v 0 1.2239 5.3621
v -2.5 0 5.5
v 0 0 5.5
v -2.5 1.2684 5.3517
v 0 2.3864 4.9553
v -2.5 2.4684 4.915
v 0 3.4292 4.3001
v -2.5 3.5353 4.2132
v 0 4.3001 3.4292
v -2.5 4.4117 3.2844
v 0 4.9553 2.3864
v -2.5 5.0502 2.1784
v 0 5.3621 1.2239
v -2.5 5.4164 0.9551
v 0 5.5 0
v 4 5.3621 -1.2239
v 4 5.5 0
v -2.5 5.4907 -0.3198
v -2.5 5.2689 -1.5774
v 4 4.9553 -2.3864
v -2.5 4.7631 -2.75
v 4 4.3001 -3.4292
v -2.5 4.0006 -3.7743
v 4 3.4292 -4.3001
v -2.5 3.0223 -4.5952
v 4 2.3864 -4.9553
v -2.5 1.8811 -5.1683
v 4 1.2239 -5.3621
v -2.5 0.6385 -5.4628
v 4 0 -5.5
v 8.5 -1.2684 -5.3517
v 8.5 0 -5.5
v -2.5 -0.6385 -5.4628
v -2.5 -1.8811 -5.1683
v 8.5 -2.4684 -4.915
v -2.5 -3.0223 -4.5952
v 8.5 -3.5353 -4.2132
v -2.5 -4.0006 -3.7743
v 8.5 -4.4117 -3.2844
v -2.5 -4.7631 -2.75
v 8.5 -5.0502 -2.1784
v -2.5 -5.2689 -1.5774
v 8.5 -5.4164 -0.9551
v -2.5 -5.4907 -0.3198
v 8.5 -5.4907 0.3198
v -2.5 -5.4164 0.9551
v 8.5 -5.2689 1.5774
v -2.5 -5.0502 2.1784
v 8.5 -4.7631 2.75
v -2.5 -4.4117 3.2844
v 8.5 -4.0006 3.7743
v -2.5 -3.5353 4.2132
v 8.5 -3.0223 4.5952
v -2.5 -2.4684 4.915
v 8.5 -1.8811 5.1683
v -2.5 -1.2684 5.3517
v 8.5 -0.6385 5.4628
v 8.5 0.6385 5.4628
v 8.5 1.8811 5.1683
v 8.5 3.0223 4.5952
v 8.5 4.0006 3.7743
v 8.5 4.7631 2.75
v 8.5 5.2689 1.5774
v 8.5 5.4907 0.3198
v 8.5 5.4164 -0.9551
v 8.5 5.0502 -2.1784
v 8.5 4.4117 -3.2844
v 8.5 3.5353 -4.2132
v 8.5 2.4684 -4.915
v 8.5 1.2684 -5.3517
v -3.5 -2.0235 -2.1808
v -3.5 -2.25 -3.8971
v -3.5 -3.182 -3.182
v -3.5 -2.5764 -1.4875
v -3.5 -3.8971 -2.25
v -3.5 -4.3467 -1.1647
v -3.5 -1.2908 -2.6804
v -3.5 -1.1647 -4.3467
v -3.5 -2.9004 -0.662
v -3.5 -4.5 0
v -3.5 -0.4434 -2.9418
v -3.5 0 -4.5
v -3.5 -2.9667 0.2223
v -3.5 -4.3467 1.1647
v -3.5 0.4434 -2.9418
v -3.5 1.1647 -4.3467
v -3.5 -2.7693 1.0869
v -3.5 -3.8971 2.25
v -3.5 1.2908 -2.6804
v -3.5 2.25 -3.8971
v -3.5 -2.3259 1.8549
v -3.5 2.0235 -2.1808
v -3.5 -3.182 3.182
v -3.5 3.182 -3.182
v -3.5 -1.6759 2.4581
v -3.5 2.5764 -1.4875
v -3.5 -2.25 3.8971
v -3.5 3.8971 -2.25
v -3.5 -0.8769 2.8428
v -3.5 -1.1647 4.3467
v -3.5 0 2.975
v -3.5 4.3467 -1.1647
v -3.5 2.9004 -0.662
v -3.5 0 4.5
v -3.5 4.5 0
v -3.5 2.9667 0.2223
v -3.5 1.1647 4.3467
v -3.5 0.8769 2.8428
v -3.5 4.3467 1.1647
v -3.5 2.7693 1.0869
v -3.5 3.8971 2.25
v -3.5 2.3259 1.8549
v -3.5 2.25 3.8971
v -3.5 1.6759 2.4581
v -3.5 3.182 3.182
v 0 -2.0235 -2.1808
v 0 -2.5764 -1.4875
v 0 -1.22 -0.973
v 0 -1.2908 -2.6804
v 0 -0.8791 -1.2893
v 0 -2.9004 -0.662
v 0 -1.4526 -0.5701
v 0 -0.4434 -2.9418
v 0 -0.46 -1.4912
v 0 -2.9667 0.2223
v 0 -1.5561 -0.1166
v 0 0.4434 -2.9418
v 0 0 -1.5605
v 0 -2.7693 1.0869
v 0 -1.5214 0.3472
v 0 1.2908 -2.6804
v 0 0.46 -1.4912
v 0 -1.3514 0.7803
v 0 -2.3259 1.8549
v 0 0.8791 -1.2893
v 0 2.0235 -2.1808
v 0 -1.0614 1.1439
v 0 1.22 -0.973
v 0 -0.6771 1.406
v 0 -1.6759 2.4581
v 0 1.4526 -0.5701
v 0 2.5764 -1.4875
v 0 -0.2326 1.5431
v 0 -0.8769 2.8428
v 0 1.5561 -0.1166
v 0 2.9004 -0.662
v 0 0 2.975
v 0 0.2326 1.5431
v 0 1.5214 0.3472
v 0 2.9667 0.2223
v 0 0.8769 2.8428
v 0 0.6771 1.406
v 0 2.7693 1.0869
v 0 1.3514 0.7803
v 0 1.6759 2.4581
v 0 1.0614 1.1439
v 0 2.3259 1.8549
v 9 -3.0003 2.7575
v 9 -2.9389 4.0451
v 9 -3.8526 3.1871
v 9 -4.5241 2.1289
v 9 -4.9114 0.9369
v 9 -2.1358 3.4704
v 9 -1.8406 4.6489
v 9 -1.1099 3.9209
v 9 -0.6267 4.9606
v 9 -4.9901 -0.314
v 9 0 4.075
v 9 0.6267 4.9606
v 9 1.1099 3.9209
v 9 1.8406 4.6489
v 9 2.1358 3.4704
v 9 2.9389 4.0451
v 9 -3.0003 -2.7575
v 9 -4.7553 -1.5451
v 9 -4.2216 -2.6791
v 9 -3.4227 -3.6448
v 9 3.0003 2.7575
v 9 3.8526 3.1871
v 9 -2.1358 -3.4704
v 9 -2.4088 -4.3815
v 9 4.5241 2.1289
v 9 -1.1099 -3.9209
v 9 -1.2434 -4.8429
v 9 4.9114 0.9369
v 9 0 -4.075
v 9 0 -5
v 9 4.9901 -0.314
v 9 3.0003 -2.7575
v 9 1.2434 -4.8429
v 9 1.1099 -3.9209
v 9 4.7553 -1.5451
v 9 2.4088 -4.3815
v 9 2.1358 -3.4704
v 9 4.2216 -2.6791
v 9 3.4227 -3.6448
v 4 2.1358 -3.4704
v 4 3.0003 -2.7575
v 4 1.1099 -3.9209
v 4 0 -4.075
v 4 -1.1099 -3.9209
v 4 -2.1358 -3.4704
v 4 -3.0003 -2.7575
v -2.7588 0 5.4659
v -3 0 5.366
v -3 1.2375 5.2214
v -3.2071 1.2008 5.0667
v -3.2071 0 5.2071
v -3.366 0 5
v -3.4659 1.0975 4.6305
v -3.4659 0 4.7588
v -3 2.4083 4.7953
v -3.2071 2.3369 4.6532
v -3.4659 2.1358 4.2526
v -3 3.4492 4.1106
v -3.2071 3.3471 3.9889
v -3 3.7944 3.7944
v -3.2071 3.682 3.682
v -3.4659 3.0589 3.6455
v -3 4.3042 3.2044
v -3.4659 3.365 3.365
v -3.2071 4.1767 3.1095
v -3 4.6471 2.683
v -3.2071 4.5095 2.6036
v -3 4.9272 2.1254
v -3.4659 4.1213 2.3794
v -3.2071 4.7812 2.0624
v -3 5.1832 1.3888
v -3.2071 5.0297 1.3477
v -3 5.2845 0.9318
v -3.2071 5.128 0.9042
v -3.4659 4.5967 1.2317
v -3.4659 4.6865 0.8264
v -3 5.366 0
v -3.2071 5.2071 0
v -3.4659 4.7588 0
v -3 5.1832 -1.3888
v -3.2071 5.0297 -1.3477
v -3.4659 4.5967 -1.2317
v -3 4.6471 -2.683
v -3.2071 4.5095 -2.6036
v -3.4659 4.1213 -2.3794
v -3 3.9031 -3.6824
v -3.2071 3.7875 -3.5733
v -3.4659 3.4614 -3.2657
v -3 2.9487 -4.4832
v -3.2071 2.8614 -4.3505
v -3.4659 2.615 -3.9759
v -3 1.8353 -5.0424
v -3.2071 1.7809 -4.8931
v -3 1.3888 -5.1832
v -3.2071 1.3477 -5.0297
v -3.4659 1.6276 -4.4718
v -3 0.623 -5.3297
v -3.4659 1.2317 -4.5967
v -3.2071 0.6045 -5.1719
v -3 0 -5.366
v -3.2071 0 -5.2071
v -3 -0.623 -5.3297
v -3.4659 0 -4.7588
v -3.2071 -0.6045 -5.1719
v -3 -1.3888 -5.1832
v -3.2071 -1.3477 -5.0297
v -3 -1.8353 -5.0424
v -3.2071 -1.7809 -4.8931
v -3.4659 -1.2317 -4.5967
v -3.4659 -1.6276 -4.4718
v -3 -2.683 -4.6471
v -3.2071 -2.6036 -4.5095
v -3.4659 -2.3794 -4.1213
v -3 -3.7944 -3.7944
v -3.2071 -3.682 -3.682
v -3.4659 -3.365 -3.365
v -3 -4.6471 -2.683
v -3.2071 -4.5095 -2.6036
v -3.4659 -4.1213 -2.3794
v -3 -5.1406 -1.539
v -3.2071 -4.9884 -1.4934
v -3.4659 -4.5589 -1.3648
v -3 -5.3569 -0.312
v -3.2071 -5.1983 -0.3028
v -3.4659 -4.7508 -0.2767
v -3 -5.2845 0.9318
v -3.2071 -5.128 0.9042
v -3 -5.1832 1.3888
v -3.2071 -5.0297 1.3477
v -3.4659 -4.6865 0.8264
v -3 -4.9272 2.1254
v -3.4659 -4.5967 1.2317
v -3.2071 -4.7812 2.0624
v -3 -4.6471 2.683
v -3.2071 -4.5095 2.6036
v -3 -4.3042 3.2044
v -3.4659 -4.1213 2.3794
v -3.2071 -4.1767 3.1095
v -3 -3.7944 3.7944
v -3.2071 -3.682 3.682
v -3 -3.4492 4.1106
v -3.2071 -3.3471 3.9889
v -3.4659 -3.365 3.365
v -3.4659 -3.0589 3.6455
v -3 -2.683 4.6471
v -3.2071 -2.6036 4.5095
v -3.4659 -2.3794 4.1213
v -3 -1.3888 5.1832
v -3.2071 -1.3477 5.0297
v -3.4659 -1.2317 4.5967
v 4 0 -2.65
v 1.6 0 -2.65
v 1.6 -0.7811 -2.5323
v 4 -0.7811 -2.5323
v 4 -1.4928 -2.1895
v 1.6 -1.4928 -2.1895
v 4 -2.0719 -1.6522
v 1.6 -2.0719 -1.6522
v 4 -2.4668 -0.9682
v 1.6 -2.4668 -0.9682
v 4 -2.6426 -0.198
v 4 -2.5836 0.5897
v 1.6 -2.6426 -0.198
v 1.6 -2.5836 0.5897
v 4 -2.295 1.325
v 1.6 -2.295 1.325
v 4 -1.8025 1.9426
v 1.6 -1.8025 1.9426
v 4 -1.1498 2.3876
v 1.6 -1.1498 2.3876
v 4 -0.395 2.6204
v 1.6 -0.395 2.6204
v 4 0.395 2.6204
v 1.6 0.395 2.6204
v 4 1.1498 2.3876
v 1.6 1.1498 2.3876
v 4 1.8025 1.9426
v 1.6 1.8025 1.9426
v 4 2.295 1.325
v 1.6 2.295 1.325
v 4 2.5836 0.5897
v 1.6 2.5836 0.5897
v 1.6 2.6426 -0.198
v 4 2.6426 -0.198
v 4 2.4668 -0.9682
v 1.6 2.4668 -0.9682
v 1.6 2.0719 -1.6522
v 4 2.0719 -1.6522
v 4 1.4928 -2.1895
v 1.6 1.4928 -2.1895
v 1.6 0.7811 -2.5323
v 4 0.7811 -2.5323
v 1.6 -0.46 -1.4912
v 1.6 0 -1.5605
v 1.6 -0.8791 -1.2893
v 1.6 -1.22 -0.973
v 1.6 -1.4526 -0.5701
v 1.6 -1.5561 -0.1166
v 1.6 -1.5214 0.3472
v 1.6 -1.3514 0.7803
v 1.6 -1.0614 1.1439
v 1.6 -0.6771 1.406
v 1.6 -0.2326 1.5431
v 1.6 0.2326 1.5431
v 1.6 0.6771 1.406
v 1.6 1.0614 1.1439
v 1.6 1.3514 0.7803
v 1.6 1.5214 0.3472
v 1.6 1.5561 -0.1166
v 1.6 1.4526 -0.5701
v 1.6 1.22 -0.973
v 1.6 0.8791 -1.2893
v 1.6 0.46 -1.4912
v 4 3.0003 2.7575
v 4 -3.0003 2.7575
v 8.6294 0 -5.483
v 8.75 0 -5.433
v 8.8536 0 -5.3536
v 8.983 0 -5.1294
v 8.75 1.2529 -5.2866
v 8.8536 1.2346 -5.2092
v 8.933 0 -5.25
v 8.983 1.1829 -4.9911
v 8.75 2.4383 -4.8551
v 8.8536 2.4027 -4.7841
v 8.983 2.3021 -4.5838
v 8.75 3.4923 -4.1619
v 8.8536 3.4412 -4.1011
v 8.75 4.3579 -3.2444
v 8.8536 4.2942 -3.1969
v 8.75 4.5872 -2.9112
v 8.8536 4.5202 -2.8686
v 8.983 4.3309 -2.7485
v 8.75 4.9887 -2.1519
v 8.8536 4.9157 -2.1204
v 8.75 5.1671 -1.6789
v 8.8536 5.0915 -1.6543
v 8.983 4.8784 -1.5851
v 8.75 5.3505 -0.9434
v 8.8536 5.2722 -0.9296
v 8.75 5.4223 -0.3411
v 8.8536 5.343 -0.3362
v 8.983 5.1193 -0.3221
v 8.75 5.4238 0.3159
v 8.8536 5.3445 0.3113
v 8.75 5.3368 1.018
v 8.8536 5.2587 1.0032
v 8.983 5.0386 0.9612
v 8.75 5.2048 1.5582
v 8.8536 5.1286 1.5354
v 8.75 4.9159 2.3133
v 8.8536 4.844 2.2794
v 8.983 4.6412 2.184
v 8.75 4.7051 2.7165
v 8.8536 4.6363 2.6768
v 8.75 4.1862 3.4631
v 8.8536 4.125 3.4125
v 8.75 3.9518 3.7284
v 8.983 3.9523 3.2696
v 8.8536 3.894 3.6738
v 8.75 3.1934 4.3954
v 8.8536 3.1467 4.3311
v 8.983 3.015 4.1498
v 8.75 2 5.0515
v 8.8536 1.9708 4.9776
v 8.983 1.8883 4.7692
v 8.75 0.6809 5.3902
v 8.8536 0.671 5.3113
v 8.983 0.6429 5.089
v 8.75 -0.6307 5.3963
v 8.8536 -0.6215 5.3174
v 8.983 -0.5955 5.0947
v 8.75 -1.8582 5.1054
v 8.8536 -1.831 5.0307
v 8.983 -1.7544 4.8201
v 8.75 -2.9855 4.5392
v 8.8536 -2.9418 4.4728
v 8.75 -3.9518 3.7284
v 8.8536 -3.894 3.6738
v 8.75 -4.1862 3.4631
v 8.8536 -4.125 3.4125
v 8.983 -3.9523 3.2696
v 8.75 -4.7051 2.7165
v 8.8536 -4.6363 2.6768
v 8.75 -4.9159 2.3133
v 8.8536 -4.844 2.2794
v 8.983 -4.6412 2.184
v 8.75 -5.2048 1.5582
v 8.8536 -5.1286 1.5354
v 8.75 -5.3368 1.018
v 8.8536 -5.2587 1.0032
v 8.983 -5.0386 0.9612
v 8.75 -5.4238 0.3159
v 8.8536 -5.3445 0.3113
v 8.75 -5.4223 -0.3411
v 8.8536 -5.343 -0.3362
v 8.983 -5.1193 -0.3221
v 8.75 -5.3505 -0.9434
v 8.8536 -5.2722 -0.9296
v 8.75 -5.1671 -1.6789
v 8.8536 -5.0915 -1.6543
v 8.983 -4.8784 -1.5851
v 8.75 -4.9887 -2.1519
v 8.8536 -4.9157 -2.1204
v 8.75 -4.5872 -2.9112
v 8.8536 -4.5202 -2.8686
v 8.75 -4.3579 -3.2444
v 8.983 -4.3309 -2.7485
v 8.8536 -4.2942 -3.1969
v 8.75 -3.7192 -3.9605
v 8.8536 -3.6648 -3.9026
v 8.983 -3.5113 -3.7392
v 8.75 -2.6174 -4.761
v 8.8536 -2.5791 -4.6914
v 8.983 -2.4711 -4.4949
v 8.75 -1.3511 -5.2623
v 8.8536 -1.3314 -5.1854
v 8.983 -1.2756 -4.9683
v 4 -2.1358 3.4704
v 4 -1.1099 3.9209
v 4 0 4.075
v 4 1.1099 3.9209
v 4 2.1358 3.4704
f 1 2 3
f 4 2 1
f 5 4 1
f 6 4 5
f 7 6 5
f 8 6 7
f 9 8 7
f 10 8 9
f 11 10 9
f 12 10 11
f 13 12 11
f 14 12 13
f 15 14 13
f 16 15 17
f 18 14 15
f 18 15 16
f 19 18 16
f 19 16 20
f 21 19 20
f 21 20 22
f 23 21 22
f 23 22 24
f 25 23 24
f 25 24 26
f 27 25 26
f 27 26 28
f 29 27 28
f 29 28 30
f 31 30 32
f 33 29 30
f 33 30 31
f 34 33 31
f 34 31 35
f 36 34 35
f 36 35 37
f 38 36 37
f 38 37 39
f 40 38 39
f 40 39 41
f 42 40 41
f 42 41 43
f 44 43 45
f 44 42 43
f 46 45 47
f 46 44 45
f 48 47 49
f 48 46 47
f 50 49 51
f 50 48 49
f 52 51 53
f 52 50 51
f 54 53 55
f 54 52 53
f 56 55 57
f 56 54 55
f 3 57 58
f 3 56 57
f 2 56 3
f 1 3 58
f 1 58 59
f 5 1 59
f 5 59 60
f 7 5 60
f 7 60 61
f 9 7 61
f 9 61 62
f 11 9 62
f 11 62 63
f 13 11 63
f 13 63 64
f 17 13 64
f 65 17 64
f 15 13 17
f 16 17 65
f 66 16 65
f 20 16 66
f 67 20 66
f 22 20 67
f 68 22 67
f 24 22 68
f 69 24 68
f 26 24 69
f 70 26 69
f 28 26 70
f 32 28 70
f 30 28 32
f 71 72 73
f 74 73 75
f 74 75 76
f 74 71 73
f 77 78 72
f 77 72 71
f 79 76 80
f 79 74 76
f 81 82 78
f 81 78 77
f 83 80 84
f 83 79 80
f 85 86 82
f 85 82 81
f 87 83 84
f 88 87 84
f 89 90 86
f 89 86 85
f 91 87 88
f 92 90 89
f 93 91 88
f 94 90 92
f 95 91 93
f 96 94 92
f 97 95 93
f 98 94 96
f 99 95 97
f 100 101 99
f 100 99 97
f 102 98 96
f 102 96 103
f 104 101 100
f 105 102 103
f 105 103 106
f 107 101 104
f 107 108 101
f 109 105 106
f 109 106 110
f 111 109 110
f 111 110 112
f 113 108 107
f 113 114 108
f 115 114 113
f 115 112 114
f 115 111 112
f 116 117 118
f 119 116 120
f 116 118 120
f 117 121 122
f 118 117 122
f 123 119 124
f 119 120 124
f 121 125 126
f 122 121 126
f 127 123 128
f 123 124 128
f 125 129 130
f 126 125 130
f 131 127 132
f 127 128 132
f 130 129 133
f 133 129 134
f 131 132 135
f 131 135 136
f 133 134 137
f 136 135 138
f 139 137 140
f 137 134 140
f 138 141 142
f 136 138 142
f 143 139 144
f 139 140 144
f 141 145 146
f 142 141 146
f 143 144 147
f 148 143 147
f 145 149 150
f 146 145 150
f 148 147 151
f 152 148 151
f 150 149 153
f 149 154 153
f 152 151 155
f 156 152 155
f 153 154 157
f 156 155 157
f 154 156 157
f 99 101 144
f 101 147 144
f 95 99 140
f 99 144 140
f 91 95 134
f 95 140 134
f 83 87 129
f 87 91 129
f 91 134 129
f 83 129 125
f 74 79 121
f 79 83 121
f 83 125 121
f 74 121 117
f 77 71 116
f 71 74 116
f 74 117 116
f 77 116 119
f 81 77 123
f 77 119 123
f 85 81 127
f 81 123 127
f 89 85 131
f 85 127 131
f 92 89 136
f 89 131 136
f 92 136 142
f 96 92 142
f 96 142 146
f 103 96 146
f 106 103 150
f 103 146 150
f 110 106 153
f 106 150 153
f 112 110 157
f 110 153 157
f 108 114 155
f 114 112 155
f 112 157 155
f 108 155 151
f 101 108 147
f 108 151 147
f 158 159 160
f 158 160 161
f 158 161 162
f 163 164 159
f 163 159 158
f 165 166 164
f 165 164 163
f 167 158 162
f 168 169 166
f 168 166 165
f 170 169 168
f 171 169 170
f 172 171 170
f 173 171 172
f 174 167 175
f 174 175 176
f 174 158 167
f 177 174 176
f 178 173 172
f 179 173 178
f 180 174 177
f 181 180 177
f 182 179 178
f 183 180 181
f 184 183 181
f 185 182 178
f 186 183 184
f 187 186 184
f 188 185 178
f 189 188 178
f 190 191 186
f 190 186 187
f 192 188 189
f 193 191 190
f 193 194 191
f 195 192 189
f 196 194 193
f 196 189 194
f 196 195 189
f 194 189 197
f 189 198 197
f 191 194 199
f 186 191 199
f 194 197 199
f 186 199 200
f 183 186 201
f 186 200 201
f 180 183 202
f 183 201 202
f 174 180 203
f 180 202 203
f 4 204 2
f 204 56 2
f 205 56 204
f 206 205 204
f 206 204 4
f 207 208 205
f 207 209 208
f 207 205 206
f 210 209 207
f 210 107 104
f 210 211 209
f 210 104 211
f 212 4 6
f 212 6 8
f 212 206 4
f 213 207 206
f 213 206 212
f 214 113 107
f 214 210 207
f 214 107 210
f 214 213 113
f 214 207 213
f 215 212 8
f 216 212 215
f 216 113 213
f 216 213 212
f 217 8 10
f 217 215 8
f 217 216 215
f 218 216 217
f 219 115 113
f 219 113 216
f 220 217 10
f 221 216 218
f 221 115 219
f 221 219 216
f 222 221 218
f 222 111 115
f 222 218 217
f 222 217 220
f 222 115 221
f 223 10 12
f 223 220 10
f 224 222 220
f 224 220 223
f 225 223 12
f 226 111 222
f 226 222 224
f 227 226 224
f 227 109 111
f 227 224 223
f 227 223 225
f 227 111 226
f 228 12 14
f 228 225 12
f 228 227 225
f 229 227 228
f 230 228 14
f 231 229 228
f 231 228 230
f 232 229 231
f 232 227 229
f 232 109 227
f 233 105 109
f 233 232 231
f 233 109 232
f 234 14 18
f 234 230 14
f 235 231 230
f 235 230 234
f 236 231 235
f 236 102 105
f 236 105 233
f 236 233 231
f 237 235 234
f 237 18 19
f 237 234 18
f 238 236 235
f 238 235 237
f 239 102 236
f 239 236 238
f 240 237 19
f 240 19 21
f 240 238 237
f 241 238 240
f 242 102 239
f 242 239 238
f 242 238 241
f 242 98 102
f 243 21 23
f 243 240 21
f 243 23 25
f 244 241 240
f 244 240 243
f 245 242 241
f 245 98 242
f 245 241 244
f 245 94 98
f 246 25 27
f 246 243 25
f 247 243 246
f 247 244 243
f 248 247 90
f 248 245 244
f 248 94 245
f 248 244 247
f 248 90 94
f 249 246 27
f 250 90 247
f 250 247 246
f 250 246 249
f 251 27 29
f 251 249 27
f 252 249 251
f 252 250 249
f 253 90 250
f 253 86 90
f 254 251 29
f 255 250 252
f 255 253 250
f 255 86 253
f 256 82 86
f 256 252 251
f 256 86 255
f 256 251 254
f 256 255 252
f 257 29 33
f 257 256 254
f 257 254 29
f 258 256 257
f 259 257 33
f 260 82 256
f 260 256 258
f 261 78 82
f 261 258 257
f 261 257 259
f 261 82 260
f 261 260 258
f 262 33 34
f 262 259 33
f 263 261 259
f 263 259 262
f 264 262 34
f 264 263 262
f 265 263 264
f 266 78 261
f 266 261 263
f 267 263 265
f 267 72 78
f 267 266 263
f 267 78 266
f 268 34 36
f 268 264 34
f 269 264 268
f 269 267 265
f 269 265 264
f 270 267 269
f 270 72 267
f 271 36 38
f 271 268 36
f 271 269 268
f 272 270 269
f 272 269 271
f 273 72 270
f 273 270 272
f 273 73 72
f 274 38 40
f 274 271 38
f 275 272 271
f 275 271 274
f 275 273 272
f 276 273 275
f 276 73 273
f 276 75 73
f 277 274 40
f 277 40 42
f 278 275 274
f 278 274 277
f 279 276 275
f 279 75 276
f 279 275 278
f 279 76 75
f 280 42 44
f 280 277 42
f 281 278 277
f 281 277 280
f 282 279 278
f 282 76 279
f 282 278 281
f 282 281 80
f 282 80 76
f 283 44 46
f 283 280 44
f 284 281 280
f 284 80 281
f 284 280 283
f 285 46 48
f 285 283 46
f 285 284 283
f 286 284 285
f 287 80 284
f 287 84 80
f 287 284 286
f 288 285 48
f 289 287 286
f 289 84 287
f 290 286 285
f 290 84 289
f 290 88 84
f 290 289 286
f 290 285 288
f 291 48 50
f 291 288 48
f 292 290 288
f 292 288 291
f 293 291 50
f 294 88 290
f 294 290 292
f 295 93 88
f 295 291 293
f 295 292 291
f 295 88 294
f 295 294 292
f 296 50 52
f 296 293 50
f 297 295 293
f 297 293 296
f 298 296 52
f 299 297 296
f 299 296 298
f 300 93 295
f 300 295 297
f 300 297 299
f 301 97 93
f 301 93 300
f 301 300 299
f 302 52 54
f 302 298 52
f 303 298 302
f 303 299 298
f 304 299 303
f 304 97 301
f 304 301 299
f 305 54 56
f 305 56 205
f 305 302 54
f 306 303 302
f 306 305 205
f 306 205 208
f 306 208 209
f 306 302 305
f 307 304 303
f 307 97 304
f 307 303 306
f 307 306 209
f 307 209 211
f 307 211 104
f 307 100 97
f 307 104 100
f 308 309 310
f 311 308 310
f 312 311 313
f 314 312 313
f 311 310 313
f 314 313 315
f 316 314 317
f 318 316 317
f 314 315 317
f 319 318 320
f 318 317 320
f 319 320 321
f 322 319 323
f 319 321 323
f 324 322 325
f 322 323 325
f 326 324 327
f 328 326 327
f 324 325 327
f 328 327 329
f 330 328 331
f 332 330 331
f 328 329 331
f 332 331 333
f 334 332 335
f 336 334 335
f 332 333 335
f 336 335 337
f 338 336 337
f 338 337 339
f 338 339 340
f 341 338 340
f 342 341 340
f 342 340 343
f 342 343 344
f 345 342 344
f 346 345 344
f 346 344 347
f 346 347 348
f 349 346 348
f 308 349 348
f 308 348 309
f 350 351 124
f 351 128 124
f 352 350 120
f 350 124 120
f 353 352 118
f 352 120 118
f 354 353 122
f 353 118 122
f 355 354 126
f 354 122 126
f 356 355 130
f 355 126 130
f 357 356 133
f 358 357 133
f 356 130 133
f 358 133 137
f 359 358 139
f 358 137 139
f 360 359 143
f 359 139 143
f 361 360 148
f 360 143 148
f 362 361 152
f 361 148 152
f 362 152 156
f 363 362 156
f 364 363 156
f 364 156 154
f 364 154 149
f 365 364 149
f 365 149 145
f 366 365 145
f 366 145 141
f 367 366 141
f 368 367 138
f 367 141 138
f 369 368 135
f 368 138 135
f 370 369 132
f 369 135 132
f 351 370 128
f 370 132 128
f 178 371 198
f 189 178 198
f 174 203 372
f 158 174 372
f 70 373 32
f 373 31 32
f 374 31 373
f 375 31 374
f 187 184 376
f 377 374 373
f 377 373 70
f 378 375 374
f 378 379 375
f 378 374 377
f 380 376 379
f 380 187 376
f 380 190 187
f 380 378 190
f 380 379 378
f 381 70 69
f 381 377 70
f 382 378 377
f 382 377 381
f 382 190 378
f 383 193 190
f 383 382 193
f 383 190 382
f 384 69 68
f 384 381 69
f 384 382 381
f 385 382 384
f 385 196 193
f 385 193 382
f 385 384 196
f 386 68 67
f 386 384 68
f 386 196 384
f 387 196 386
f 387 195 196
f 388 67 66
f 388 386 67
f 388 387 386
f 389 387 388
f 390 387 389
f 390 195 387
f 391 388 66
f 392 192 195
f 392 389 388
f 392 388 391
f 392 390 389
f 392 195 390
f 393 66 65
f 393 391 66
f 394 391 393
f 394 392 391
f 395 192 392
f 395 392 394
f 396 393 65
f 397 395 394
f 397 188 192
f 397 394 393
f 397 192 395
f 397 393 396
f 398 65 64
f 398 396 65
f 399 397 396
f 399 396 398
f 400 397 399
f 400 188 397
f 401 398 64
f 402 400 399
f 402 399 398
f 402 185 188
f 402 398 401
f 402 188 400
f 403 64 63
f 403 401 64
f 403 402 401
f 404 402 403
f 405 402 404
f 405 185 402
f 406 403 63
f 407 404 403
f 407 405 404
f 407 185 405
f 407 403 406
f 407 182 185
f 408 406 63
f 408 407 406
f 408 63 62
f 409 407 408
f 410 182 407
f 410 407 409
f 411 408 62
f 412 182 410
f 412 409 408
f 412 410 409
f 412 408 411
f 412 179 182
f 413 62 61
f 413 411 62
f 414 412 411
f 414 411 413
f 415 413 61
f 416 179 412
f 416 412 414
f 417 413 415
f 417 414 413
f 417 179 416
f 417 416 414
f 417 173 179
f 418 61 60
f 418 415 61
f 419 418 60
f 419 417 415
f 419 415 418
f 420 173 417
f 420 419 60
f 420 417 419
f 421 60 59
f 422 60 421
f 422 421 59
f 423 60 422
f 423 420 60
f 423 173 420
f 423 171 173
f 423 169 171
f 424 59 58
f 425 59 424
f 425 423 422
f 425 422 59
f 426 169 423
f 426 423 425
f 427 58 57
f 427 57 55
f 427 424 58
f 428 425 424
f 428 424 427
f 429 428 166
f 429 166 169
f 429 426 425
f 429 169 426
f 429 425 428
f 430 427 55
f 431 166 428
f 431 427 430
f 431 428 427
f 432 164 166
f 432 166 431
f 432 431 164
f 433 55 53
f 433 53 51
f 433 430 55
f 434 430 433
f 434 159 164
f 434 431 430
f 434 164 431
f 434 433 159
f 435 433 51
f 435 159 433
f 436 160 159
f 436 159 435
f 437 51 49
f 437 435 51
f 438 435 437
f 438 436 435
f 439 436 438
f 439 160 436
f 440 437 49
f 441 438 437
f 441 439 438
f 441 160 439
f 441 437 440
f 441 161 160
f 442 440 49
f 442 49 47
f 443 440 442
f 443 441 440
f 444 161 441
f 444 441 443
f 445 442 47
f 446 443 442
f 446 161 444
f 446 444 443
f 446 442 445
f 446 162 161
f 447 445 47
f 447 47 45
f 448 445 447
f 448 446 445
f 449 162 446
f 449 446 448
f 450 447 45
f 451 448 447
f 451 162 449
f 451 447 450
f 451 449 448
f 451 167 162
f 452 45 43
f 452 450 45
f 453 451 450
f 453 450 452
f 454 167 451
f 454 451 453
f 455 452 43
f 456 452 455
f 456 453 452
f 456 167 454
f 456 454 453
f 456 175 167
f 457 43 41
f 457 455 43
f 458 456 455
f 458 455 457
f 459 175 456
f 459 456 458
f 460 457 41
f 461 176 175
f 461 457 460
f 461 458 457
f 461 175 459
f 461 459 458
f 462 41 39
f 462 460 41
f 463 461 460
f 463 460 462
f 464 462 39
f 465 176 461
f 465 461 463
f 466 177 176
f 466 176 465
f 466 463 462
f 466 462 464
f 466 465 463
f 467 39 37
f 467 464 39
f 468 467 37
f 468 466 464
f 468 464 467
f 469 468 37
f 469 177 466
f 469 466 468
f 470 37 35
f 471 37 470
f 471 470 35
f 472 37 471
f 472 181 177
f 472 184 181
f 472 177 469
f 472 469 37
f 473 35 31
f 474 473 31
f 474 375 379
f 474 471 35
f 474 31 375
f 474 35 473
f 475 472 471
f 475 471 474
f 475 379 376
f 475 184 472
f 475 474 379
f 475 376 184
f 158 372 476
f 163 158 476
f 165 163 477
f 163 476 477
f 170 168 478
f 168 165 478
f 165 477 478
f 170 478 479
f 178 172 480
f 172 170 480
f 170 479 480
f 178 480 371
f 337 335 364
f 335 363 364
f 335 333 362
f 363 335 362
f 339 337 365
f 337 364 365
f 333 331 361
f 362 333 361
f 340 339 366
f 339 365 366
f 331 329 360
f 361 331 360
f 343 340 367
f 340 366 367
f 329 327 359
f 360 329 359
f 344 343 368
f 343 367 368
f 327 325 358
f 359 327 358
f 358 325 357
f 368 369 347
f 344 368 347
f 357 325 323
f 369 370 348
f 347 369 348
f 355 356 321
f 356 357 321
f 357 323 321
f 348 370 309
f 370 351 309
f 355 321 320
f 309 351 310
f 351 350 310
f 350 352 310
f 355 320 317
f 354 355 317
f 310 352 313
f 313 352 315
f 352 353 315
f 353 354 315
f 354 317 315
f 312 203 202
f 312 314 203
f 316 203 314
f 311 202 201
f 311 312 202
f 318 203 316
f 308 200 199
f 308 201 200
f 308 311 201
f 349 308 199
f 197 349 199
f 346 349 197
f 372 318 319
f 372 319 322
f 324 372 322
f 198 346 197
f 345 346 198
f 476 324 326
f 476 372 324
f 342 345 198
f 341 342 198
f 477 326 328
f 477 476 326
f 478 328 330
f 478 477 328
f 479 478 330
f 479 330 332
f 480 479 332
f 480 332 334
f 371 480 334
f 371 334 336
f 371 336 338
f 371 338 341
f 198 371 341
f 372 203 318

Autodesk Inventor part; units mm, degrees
ref_plane "YZ Plane" through (0, 0, 0) normal (1, 0, 0) x (0, 1, 0)
ref_plane "XZ Plane" through (0, 0, 0) normal (0, 1, 0) x (-1, 0, 0)
ref_plane "XY Plane" through (0, 0, 0) normal (0, 0, 1) x (1, 0, 0)
sketch "Sketch5" plane through (0, 0, 0) normal (1, 0, 0) x (0, 1, 0)
  circle A0 centre (0, 0) radius 5.5
  dimension "d11" = 11
extrude "Extrusion5" add sketch "Sketch5" along normal blind 4
sketch "Sketch7" plane through (4, 0, 0) normal (1, 0, 0) x (0, 0, -1)
  circle A0 centre (0, 0) radius 5.5 projected
hole "Hole1" at (4, 0, 0) direction (-1, 0, 0) diameter 3.121 end through all counterbore diameter 5.3 counterbore depth 2.4
sketch "Sketch10" plane through (4, 0, 0) normal (1, 0, 0) x (0, 0, -1)
  line L0 (-2.7575, 3.0003) -> (2.7575, 3.0003)
  line L1 (2.7575, -3.0003) -> (-2.7575, -3.0003)
  line L2 (-2.7575, 3.0003) -> (2.7575, -3.0003) construction
  line L3 (2.7575, 3.0003) -> (-2.7575, -3.0003) construction
  arc A0 (2.7575, 3.0003) -> (-2.7575, 3.0003) centre (0, 0) ccw
  arc A1 (-2.7575, -3.0003) -> (2.7575, -3.0003) centre (0, 0) ccw
extrude "Extrusion8" add sketch "Sketch10" along normal blind 5
sketch "Sketch11" plane through (4, 0, 0) normal (1, 0, 0) x (0, 0, -1)
  circle A0 centre (0, 0) radius 1.5605 projected
  circle A1 centre (0, 0) radius 4.075
  circle A2 centre (0, 0) radius 5.5 projected
sketch "Sketch12" plane through (0, 0, 0) normal (-1, 0, 0) x (0, 0, 1)
  circle A0 centre (0, 0) radius 2.975
  circle A1 centre (0, 0) radius 5.5 projected
  dimension "d35" = 5.95
extrude "Extrusion10" add sketch "Sketch12" along normal blind 3.5
extrude "Extrusion11" add sketch "Sketch11" along normal blind 5 contours A2
fillet "Fillet4" radius 1 1 edges at (-3.5, 0, -5.5)
fillet "Fillet4" radius 0.5 1 edges at (9, 0, 5.5)
properties part number "servo_adapter"
